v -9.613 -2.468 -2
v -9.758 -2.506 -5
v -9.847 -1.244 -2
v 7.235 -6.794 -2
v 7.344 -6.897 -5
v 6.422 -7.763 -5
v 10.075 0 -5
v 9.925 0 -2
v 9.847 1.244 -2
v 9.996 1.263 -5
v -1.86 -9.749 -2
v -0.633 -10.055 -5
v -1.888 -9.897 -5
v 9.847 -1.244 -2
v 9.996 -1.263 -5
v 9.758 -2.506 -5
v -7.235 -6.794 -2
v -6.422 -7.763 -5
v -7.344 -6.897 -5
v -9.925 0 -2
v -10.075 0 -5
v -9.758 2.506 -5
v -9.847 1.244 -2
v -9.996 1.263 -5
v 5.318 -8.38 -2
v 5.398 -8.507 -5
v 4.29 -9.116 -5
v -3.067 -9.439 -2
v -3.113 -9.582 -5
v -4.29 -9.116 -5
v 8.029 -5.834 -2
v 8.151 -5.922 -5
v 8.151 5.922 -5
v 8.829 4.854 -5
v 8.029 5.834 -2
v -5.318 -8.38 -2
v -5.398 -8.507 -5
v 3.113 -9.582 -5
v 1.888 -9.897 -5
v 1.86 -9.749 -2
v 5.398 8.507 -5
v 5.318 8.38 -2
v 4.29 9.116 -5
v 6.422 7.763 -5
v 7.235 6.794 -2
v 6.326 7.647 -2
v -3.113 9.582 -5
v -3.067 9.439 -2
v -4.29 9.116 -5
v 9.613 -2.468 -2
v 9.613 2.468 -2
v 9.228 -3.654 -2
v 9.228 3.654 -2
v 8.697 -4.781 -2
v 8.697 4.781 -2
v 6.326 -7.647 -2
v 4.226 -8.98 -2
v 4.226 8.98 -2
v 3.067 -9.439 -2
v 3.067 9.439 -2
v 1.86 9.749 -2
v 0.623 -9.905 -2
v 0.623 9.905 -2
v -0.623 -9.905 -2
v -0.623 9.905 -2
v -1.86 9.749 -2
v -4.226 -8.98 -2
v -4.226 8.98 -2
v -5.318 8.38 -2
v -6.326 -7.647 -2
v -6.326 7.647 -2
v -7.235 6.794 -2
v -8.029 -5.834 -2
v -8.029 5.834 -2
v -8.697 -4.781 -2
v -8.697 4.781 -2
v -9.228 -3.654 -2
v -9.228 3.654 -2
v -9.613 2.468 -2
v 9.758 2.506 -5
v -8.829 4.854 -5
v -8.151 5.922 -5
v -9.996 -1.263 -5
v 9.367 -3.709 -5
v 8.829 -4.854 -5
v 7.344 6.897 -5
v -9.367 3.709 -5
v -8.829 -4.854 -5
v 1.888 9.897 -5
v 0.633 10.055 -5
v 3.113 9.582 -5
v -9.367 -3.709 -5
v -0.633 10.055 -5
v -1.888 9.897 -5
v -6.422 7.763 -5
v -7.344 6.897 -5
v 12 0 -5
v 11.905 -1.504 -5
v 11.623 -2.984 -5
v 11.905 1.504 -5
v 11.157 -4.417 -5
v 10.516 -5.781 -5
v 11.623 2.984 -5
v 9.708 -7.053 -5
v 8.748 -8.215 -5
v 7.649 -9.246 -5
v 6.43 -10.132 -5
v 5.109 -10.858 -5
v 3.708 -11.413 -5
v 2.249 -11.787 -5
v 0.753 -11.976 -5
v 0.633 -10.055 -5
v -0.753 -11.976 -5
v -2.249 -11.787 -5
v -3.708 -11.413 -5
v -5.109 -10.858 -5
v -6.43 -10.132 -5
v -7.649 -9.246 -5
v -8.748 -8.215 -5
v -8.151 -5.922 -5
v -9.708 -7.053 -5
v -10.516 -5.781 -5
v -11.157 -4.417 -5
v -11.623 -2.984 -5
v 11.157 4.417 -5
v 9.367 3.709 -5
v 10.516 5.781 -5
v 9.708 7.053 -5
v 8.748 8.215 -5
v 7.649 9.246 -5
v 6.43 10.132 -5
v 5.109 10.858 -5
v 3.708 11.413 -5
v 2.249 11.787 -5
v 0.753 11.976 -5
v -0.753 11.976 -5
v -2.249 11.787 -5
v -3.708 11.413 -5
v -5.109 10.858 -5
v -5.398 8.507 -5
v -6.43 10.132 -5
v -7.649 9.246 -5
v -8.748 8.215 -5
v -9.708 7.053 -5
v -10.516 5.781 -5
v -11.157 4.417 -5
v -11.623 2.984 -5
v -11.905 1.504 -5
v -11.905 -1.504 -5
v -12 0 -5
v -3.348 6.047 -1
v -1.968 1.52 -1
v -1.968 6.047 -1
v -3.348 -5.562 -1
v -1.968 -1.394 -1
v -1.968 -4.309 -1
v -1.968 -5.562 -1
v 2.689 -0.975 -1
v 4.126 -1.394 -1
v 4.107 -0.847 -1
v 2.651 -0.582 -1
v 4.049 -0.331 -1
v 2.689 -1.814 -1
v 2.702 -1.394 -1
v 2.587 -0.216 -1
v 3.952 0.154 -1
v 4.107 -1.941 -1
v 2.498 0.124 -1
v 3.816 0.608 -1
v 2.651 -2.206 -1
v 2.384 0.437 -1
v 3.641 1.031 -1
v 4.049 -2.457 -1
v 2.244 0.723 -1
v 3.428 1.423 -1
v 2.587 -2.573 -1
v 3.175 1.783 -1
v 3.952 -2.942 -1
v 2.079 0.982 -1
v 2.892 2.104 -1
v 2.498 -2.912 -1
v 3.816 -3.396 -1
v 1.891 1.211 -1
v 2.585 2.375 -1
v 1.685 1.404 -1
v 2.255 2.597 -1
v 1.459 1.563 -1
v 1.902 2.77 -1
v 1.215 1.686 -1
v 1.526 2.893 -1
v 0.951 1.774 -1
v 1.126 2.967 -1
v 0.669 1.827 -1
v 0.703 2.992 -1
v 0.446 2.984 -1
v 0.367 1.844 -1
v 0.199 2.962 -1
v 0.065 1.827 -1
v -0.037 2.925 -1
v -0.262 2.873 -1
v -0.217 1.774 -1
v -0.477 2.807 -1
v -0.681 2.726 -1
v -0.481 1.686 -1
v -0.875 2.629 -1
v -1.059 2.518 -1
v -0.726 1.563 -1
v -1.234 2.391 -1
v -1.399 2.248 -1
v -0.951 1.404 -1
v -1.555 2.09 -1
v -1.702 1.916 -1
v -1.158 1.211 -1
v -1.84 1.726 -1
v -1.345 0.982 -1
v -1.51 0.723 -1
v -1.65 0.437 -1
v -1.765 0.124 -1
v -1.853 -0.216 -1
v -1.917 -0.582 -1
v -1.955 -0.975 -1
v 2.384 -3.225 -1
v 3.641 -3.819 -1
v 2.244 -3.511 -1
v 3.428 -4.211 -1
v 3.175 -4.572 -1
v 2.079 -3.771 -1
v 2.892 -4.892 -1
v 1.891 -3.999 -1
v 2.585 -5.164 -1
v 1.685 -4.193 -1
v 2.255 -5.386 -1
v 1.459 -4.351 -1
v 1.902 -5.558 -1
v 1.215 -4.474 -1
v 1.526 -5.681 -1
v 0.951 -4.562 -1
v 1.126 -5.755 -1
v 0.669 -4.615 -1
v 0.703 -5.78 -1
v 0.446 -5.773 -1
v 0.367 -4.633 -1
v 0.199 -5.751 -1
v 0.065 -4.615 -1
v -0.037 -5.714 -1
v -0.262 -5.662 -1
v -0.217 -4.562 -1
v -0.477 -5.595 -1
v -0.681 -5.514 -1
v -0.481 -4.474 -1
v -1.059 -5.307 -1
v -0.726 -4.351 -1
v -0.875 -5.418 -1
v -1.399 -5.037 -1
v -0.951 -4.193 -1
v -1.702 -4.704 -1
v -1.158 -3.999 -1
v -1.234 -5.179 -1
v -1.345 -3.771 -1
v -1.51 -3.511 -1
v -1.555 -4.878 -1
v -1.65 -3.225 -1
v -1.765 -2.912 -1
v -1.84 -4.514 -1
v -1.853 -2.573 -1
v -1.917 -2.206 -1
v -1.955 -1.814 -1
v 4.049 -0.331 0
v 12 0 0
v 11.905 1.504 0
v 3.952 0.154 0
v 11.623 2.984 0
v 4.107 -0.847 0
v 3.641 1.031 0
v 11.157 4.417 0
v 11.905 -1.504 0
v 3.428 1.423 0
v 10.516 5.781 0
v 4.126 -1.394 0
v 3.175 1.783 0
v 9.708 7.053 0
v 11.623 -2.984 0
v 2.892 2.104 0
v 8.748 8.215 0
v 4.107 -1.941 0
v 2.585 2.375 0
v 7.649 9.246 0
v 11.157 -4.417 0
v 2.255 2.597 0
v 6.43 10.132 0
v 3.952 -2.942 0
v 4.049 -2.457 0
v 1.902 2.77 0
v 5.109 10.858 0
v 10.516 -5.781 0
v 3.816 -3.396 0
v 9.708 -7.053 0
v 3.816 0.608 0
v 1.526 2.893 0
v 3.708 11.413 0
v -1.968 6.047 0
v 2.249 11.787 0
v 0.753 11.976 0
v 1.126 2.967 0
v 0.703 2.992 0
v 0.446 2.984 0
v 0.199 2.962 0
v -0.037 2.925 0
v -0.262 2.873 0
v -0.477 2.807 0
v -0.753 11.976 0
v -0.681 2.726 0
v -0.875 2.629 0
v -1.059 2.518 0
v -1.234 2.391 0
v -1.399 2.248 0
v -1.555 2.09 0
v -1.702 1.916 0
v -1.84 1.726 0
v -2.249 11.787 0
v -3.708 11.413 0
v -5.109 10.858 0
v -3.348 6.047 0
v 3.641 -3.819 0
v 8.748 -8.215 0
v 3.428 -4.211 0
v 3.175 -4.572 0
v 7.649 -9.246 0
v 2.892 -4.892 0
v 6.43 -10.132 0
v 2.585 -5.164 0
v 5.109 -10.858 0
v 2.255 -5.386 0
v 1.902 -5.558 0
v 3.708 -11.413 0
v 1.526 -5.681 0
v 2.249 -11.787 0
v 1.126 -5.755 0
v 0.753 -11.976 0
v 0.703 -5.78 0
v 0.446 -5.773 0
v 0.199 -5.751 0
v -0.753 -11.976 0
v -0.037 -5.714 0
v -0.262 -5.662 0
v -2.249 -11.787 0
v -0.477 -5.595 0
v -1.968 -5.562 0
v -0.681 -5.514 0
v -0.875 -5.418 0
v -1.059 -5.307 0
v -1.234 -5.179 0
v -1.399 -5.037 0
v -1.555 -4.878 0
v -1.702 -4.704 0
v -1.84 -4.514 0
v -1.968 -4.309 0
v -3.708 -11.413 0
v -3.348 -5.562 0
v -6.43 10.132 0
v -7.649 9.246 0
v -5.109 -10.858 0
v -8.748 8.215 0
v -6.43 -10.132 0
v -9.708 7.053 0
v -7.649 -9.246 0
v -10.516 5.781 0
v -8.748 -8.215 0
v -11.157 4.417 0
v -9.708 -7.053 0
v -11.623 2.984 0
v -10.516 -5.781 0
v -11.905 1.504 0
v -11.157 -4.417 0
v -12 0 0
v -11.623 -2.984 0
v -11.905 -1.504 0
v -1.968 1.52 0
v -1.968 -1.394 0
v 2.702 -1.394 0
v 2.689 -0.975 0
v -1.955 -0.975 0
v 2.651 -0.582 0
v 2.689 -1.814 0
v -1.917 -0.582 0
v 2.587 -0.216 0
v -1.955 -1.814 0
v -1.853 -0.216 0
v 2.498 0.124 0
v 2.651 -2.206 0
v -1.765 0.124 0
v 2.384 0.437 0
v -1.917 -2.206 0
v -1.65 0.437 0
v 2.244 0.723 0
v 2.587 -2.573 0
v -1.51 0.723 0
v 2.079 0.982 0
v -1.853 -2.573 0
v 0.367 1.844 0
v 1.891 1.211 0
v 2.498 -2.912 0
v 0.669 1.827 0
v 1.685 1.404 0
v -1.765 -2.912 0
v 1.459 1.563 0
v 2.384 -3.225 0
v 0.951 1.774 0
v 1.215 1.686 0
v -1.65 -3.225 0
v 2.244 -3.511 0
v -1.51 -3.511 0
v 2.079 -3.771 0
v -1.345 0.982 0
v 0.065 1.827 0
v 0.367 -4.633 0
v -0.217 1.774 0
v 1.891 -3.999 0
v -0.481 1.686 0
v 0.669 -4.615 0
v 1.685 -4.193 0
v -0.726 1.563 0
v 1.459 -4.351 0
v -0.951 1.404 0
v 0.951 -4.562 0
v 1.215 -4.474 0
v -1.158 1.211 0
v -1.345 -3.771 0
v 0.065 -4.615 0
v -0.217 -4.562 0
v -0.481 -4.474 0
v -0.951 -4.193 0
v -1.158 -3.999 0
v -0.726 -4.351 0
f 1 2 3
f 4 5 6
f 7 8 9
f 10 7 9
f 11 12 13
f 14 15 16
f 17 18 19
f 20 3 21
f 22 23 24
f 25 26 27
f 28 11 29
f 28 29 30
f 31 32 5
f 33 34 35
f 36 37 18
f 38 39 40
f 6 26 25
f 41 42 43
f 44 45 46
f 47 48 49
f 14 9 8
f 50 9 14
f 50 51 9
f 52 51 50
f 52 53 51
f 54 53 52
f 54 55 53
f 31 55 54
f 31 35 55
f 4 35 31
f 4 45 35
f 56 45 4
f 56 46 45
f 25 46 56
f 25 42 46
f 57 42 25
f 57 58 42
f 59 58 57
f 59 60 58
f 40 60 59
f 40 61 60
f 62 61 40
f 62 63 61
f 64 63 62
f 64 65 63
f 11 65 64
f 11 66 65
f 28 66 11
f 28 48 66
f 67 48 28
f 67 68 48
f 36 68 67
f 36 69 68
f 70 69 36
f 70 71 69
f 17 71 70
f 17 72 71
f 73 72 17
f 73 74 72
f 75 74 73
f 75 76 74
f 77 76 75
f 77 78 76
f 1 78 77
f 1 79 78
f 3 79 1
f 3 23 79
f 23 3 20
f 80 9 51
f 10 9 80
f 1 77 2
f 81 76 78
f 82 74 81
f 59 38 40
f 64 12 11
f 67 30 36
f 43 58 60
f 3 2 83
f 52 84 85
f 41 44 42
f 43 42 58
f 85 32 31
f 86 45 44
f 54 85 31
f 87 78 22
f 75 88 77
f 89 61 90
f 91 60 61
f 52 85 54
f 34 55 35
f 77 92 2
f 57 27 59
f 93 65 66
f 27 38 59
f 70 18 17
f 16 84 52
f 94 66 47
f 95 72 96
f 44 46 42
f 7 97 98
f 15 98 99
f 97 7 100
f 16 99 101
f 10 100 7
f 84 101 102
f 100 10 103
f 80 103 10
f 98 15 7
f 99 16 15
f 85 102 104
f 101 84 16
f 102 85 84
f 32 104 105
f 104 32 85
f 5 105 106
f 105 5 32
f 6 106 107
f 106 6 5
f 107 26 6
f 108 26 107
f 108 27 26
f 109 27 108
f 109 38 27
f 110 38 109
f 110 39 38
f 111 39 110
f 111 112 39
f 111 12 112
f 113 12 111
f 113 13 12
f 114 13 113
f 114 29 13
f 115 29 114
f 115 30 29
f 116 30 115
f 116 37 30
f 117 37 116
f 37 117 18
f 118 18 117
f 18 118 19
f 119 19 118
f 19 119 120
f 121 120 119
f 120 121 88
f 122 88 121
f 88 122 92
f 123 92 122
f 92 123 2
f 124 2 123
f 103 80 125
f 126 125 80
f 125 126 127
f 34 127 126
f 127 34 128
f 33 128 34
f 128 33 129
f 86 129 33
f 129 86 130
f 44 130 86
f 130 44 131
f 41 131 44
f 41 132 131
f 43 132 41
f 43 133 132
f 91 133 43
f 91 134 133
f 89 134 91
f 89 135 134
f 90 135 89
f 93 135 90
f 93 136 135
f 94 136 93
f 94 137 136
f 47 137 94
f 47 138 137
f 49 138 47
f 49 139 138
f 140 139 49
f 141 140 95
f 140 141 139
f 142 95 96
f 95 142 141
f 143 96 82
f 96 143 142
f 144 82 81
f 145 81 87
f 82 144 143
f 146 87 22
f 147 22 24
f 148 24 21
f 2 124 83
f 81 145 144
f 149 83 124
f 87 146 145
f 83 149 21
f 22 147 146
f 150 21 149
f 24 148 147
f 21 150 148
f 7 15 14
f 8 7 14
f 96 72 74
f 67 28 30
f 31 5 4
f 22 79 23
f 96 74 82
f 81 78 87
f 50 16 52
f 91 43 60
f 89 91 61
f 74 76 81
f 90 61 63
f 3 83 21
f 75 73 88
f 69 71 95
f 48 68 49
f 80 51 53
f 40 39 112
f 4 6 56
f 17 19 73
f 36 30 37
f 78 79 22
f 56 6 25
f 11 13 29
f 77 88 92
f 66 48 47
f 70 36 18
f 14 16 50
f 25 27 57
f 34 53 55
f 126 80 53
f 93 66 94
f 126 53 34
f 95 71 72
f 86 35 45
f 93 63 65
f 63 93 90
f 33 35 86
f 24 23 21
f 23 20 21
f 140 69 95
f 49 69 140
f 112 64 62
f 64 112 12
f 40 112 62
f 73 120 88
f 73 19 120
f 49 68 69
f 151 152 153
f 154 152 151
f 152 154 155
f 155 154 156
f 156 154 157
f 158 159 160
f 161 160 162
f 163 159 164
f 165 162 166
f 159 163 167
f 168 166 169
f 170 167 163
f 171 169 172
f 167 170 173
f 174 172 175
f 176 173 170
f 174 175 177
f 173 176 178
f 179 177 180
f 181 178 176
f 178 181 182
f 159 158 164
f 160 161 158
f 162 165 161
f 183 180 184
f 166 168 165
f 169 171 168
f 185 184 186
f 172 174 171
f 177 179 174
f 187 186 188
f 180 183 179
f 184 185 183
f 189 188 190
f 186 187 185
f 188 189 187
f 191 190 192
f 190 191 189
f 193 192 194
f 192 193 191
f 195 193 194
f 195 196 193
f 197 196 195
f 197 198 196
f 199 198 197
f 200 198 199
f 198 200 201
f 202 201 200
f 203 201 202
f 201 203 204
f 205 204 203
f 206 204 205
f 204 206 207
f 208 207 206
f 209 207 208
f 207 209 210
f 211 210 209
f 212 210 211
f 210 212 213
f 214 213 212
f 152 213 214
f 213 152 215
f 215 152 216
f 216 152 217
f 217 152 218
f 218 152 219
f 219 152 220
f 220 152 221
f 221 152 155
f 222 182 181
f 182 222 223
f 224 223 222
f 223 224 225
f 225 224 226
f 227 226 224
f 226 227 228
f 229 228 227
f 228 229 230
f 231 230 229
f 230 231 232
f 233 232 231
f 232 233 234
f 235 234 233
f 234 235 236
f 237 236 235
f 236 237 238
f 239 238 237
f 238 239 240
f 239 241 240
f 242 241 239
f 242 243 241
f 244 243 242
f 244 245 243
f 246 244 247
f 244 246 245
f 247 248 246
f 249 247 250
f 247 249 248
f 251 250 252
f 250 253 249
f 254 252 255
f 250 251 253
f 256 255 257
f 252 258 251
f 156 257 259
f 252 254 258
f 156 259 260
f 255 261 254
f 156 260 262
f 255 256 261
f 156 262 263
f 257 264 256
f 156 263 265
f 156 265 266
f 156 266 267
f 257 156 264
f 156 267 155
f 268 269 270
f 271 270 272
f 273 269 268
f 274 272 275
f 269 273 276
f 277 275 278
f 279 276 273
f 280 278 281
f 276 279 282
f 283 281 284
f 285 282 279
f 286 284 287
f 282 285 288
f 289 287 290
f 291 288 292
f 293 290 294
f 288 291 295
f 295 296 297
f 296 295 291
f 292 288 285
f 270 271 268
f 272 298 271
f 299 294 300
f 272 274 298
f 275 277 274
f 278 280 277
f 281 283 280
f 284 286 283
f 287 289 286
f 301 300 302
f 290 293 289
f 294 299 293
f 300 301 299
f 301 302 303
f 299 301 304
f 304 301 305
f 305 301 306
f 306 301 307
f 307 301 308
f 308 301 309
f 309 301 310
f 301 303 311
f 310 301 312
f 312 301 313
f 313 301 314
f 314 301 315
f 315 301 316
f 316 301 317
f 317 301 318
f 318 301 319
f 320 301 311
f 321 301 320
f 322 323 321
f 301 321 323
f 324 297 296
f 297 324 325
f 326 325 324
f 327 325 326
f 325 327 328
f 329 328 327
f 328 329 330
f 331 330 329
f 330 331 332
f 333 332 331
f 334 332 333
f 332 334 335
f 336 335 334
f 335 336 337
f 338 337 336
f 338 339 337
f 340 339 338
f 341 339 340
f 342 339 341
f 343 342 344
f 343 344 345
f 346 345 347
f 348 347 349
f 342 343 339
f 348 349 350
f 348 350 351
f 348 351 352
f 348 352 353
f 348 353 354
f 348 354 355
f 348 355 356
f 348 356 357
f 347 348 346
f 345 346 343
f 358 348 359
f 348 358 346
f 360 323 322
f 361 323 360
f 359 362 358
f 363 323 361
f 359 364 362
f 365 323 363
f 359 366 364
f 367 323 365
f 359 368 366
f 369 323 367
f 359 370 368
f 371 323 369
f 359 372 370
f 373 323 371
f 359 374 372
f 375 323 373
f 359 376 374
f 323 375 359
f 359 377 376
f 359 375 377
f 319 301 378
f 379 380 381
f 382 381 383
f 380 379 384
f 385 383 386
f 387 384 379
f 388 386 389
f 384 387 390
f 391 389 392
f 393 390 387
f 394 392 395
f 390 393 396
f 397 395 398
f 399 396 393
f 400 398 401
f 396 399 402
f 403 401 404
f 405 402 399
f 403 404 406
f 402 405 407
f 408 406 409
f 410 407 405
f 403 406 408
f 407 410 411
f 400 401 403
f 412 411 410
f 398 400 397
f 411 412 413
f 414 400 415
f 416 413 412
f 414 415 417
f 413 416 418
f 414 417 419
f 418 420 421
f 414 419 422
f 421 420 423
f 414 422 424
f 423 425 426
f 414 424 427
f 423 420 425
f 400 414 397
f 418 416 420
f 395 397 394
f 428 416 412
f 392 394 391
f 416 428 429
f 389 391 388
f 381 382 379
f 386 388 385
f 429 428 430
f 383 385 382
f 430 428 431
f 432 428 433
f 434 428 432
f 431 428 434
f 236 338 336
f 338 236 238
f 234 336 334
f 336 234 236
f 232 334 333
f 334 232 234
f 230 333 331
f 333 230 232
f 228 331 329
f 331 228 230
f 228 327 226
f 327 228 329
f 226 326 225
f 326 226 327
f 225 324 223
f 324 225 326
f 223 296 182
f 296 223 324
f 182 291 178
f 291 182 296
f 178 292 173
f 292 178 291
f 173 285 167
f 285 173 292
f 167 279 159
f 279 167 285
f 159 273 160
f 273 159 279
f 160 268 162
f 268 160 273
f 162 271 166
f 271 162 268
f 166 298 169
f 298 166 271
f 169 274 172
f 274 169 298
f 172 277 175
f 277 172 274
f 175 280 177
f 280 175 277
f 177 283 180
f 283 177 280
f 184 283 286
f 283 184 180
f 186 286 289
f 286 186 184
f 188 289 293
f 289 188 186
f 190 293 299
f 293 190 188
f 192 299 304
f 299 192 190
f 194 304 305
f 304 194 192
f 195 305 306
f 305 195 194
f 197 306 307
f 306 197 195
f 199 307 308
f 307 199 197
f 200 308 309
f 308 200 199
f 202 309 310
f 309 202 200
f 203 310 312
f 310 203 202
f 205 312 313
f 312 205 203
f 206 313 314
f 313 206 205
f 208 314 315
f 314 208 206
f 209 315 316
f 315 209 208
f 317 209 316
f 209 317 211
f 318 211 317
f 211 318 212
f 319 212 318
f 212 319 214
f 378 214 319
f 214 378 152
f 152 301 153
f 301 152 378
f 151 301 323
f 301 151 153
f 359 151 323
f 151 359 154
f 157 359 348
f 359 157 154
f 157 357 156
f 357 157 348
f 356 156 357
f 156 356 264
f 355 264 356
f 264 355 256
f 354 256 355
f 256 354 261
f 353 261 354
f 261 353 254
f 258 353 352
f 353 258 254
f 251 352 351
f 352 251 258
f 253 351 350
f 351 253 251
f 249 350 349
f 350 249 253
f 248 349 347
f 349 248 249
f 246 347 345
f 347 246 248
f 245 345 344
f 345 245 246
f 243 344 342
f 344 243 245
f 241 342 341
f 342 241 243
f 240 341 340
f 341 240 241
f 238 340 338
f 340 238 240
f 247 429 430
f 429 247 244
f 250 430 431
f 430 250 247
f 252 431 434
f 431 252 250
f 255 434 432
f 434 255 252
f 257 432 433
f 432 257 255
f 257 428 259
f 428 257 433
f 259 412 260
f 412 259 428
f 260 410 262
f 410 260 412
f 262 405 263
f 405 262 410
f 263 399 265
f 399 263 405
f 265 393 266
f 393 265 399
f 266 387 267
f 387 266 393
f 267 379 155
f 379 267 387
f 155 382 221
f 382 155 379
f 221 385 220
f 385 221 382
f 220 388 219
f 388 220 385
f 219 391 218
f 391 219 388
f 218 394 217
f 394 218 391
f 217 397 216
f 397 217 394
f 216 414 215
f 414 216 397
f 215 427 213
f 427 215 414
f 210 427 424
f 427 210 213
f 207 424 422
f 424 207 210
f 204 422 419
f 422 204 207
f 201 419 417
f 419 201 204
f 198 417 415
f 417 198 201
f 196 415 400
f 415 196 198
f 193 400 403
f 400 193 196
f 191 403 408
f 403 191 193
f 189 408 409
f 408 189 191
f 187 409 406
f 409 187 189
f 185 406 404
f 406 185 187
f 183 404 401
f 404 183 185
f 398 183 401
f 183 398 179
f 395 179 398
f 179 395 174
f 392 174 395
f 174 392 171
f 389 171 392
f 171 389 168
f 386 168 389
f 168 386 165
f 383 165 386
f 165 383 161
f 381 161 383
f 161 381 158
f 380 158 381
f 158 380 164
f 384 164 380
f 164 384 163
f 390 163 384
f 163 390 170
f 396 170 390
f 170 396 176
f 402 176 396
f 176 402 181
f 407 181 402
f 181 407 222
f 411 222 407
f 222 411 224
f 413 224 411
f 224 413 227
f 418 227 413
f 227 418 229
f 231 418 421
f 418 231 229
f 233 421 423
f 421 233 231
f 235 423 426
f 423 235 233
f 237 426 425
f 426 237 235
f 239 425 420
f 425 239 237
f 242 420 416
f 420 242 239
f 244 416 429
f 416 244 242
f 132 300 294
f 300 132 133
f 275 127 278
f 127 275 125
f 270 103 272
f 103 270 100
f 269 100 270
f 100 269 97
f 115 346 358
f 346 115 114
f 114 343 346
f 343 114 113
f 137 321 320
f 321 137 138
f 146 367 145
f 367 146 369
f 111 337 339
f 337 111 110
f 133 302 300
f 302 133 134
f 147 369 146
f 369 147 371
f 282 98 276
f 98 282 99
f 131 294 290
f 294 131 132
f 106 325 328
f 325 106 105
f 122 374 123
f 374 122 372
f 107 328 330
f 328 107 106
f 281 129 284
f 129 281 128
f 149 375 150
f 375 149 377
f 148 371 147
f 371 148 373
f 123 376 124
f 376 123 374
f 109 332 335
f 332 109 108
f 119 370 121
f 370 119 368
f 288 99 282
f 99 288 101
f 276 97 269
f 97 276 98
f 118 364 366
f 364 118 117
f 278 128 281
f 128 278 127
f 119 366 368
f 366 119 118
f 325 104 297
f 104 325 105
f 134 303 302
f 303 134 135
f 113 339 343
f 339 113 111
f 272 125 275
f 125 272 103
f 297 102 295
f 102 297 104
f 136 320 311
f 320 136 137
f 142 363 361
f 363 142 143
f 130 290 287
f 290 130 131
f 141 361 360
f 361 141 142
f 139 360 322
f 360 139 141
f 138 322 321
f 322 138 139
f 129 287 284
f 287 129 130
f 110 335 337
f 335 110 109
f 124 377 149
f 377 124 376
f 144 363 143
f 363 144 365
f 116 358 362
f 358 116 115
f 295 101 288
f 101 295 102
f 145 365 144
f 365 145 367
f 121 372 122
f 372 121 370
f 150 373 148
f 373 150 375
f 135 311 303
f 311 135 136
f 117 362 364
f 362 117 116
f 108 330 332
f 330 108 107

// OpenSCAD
$fn = 50;

difference() {
	union() {
		translate(v = [0, 0, -5.0]) {
			cylinder(h = 5, r = 12.0);
		}
	}
	union() {
		#translate(v = [0, 0, -5.0]) {
			cylinder(h = 3, r1 = 10.075, r2 = 9.925);
		}
		translate(v = [0, 0, -1]) {
			linear_extrude(height = 1) {
				text(font = "Webdings", halign = "center", size = 11, text = "b", valign = "center");
			}
		}
	}
}
